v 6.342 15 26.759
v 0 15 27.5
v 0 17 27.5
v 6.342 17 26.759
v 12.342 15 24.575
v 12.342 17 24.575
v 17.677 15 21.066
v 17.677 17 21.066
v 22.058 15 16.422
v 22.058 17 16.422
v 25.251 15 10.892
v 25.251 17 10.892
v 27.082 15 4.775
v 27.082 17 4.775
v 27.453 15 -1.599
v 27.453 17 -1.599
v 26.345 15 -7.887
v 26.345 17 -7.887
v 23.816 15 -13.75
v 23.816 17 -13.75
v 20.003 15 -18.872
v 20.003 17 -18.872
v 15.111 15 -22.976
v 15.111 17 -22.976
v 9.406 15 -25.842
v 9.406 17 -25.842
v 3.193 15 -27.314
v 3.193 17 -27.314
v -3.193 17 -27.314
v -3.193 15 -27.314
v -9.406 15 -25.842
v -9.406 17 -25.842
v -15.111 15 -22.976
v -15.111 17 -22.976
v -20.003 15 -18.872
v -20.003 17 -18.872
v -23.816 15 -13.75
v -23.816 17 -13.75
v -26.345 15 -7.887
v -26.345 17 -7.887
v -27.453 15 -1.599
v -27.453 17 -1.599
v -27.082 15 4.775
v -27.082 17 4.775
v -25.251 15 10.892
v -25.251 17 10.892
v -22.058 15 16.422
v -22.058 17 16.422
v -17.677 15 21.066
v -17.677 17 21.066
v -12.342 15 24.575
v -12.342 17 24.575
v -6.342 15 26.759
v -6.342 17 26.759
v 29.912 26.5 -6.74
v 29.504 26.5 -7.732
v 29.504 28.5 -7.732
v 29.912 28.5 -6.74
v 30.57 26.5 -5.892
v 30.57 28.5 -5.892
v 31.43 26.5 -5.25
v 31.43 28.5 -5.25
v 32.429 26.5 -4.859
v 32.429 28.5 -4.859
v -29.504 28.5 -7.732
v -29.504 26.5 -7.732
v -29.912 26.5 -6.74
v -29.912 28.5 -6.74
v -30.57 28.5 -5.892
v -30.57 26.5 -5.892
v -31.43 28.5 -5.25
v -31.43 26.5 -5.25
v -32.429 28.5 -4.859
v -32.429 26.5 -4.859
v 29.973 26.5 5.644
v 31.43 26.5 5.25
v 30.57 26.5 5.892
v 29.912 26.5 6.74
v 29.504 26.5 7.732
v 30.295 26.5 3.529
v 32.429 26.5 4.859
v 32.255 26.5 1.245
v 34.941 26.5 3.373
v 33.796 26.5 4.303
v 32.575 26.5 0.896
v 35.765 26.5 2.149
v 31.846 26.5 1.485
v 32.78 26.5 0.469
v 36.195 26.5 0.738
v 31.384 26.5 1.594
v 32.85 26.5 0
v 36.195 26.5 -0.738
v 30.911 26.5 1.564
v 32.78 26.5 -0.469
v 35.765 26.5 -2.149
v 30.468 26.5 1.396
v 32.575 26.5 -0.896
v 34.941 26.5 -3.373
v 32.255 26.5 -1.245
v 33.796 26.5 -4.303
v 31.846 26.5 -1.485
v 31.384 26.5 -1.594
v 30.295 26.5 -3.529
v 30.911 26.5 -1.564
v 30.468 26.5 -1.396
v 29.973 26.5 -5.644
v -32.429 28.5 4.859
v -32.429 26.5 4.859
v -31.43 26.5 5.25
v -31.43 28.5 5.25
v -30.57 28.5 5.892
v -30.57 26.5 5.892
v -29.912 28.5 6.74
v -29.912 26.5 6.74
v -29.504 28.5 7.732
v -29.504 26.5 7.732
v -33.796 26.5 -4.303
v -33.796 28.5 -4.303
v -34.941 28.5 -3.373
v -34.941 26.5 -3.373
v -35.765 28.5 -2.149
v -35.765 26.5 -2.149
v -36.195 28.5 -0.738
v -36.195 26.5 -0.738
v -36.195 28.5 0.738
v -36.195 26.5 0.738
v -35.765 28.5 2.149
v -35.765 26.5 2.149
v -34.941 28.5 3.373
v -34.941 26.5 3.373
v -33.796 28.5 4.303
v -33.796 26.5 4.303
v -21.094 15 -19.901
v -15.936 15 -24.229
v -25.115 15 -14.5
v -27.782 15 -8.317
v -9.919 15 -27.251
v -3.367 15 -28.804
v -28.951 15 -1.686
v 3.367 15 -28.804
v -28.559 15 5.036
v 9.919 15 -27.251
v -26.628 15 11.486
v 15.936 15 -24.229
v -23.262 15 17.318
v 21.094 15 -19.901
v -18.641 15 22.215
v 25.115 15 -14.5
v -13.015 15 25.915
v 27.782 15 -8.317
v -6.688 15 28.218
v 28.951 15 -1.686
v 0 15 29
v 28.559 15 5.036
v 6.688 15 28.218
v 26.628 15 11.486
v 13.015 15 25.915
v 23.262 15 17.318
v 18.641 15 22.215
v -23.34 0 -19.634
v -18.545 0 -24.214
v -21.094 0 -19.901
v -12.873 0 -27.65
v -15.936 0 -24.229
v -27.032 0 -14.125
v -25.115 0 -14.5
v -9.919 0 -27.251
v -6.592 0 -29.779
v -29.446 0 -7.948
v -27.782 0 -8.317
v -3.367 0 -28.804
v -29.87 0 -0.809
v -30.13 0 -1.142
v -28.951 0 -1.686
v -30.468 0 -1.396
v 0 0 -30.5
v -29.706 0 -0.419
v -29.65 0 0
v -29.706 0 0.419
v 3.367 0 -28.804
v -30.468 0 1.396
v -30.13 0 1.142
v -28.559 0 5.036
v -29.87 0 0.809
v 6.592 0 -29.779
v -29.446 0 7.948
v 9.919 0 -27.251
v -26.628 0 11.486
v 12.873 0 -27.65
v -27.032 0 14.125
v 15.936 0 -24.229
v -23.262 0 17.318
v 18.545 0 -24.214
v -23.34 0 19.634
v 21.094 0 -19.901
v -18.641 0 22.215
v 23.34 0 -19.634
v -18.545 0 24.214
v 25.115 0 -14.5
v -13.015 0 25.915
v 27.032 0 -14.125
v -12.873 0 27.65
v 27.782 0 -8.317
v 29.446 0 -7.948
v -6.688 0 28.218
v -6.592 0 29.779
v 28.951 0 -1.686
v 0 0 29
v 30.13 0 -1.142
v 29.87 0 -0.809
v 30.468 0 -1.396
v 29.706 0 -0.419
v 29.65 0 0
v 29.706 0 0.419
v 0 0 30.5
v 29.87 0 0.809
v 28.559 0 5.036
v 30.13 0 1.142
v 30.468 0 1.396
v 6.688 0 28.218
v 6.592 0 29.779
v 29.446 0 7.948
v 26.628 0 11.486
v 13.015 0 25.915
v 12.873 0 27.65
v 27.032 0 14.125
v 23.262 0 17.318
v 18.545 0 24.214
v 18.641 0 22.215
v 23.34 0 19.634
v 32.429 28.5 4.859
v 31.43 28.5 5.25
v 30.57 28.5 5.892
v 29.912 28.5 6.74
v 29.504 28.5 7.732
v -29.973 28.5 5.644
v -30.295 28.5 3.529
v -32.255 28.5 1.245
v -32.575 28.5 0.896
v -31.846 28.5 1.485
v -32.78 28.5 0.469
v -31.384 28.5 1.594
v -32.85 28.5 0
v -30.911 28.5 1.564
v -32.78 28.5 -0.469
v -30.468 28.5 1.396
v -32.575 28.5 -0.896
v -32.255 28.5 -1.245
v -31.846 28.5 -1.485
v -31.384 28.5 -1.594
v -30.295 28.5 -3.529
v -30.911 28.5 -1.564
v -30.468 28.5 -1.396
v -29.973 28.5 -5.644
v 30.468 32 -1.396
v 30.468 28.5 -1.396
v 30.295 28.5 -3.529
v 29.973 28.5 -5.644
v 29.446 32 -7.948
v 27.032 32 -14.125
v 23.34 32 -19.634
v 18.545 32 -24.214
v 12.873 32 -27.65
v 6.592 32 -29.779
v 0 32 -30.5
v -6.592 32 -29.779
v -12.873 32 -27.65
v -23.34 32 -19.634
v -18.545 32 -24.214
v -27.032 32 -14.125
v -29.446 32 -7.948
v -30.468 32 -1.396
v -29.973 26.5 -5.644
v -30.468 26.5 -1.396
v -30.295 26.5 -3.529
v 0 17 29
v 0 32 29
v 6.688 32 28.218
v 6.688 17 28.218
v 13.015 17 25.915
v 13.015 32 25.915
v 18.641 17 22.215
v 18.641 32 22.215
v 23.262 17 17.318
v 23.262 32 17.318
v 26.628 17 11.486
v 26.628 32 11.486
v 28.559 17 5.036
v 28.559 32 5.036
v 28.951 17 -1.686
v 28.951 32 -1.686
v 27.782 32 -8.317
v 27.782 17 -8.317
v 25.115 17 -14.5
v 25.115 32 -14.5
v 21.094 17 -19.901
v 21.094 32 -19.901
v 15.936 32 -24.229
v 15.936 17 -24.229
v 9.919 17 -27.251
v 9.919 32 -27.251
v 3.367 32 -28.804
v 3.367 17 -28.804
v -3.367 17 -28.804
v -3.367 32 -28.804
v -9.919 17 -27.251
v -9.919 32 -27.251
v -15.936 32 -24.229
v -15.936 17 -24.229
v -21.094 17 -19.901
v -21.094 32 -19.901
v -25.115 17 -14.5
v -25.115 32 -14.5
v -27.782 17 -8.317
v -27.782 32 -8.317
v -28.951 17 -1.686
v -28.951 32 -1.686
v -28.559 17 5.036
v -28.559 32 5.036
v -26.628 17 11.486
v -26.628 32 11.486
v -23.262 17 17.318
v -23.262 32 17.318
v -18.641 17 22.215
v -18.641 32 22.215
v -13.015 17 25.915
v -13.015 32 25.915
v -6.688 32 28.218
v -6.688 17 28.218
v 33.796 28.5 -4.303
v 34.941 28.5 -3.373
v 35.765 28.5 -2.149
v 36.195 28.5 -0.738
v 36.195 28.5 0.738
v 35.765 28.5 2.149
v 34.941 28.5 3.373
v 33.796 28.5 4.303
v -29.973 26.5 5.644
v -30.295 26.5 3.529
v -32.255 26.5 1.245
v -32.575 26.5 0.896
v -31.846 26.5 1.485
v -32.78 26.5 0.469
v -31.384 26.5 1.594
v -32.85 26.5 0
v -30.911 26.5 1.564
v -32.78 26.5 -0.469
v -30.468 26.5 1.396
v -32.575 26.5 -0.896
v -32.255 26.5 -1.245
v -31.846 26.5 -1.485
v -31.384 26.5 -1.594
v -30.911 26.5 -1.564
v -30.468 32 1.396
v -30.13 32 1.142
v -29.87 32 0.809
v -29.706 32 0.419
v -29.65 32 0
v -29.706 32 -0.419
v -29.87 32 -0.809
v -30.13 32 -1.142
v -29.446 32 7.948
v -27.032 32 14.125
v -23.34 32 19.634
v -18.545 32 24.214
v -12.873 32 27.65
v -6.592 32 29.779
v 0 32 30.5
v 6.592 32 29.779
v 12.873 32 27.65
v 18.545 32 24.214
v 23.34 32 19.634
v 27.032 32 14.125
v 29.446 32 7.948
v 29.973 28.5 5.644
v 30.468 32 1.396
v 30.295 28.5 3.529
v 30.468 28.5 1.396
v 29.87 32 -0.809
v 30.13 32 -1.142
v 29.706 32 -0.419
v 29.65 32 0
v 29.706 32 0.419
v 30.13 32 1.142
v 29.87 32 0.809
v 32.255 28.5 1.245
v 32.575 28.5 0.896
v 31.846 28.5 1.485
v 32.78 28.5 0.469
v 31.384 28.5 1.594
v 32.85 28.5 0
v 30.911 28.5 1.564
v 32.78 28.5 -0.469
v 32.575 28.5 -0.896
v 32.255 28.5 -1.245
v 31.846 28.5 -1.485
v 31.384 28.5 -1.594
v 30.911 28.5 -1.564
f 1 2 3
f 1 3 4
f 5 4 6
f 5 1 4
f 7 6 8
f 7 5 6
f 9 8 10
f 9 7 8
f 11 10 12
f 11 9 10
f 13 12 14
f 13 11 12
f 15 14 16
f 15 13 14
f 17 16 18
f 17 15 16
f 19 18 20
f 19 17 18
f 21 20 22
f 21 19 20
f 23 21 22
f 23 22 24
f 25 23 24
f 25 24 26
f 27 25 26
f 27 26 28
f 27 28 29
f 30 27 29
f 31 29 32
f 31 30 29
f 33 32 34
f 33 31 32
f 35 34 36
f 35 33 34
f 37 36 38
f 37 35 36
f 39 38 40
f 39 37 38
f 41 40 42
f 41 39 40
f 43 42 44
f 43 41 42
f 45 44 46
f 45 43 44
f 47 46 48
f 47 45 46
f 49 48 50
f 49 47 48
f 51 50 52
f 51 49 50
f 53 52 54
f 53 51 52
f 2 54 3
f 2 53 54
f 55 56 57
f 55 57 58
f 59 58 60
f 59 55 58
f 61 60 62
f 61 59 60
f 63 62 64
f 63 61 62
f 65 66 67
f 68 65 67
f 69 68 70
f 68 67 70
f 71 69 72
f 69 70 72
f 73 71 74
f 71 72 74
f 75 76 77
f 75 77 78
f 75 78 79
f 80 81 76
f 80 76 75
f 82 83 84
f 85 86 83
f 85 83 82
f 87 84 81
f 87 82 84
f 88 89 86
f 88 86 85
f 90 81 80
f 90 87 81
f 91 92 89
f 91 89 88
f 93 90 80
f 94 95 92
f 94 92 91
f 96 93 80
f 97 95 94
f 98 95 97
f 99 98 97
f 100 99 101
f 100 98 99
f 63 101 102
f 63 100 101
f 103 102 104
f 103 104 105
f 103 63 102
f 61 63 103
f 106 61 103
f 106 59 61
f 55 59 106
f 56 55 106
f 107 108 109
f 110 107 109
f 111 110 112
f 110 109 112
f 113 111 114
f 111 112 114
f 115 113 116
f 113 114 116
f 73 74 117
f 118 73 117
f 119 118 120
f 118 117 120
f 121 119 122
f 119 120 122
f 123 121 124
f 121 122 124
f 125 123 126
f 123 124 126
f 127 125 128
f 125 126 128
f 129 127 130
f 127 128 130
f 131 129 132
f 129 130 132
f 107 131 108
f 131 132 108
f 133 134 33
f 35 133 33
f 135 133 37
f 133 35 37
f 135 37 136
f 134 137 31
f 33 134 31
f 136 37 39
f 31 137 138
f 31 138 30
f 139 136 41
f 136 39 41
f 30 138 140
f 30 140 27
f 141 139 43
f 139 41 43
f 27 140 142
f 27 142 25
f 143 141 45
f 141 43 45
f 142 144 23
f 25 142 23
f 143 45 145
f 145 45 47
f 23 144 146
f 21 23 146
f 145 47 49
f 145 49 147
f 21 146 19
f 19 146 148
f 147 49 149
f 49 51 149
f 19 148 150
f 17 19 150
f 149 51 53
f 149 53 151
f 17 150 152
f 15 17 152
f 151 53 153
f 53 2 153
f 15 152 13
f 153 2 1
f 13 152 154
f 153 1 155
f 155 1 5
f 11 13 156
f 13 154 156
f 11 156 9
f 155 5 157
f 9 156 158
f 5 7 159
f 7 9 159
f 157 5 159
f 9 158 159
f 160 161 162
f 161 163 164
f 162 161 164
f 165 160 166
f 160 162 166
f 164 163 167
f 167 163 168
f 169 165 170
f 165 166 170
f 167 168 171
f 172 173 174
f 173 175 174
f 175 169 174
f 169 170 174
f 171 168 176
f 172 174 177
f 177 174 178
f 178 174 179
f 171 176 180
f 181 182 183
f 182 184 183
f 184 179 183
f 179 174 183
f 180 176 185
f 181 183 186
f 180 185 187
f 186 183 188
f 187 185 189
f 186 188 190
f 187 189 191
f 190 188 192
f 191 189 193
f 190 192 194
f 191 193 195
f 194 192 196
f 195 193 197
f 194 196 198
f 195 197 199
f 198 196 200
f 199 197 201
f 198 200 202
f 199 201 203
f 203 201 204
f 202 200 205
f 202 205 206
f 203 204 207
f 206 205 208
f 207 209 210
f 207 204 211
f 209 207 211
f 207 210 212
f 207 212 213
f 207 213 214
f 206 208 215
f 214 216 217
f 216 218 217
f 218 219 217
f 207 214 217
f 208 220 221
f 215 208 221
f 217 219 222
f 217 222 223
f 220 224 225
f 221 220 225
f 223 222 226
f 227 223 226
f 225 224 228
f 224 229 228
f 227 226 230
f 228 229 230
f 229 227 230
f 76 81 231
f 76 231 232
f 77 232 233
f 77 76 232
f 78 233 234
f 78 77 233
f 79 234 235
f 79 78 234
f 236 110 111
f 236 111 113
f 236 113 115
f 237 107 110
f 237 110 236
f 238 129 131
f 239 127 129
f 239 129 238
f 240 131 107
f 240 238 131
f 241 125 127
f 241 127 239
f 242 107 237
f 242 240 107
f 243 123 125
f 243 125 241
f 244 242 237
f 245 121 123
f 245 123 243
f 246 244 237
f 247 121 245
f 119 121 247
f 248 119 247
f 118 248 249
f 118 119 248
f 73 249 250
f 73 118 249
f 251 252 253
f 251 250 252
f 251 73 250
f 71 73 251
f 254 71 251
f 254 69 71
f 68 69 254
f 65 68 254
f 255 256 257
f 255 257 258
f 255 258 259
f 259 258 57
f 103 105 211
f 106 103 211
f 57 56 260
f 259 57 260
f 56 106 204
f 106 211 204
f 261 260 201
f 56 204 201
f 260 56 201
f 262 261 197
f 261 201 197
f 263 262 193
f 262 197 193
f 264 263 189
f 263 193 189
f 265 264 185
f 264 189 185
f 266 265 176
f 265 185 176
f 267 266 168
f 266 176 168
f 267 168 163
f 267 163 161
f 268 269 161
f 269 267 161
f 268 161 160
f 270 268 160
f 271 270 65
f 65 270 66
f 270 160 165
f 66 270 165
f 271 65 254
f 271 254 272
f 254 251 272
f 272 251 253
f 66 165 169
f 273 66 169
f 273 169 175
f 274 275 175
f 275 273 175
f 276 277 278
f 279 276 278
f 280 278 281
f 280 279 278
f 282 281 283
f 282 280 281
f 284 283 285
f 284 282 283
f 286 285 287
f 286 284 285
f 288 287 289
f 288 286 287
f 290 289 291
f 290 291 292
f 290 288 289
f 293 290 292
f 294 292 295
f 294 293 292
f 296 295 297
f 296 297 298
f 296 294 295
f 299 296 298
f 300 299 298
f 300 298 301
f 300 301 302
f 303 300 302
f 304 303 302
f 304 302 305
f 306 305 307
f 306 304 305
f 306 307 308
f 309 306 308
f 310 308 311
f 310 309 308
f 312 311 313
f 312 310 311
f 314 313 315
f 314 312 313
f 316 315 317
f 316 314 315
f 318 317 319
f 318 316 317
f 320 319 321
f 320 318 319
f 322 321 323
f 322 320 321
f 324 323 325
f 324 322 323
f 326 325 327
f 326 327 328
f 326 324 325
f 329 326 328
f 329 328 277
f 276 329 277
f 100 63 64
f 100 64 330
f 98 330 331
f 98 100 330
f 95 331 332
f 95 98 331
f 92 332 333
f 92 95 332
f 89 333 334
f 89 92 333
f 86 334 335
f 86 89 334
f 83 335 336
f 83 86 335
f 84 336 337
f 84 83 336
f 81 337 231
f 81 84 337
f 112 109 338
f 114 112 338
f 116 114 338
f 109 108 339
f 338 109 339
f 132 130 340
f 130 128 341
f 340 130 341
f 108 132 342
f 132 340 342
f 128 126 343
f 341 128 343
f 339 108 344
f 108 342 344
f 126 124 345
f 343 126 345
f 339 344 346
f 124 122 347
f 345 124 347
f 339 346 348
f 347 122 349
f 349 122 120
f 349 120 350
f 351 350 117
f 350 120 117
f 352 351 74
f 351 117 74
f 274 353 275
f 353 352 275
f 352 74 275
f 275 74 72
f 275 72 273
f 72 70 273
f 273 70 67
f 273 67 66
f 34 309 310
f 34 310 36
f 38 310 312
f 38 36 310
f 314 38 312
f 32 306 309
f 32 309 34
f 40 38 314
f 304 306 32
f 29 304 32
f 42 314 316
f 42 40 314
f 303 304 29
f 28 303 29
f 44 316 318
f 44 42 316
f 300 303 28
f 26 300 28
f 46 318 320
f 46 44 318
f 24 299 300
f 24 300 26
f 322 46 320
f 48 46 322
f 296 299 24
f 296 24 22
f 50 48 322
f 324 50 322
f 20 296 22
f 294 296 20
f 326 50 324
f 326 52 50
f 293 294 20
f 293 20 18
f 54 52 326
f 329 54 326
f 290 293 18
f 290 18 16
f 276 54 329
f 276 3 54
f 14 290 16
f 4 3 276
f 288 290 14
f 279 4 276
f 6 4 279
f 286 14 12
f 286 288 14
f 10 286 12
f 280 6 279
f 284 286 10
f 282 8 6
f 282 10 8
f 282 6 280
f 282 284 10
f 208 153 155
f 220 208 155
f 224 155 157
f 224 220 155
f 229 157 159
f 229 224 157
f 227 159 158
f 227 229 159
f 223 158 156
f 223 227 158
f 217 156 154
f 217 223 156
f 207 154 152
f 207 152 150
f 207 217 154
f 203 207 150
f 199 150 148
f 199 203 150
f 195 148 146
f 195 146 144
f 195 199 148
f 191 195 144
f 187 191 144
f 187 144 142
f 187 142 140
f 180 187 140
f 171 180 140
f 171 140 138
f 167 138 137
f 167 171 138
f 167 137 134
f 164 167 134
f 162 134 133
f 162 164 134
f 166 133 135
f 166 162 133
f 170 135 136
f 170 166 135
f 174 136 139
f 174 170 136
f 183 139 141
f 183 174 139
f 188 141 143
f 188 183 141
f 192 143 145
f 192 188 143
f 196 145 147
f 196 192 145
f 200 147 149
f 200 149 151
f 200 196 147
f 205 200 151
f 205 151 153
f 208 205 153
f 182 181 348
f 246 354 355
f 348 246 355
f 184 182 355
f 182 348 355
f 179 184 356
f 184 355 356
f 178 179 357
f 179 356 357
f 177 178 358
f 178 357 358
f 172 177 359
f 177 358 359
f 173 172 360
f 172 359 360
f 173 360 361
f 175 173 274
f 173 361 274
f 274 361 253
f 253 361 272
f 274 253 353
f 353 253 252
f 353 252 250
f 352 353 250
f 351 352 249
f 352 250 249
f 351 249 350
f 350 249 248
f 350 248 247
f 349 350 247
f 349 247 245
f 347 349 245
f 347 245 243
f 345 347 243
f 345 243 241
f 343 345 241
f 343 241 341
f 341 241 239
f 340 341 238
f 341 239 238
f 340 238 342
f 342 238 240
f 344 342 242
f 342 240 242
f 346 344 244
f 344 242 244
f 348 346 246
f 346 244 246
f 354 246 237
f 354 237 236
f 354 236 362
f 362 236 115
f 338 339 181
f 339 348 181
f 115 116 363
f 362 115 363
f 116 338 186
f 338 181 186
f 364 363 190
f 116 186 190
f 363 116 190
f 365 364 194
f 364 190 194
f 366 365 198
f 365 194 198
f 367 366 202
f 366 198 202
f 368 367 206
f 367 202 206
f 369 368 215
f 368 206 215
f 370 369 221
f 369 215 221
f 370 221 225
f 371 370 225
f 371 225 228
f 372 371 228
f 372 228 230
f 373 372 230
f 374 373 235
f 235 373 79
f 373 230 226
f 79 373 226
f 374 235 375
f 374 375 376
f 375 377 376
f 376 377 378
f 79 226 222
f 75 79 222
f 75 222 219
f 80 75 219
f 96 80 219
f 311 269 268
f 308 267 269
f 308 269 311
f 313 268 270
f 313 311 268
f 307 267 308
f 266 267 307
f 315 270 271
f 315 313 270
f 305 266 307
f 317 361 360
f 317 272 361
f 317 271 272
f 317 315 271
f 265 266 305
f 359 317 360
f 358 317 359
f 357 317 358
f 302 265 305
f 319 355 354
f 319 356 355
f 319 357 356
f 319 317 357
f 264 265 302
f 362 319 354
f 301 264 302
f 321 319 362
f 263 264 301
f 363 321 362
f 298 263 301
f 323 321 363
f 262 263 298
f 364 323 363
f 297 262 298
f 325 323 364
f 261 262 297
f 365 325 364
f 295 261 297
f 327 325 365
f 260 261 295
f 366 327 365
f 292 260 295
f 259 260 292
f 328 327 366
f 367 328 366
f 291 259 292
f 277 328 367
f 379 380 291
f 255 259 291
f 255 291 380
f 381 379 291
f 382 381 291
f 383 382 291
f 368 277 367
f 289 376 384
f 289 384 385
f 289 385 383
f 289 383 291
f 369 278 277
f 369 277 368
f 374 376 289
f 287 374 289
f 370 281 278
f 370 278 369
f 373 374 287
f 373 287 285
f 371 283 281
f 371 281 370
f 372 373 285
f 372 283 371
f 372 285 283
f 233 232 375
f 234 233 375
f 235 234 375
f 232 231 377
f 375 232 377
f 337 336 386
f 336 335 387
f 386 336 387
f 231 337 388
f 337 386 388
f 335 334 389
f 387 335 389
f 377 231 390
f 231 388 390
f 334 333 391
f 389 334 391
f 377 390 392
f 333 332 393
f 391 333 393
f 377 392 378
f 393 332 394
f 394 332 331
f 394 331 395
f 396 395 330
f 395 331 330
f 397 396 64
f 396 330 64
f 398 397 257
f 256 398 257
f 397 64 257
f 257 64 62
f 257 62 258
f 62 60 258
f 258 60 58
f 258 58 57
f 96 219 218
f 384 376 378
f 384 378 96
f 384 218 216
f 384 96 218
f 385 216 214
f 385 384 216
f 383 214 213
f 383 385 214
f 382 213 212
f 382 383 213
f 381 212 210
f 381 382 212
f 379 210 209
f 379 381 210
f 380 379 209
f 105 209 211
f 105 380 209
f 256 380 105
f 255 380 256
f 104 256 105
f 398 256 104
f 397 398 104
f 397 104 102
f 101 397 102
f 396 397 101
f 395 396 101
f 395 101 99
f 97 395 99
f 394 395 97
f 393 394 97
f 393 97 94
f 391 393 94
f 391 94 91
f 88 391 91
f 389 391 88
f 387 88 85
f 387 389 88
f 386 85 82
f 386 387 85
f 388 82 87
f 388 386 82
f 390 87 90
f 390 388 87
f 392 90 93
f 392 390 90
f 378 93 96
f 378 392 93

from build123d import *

# Parameters (mm, degrees)
SKETCH1_R           = 30.5
SKETCH1_R_2         = 29
BOSS_EXTRUDE1_DEPTH = 15
SKETCH2_R           = 30.5
SKETCH2_R_2         = 27.5
BOSS_EXTRUDE2_DEPTH = 2
SKETCH3_R           = 30.5
SKETCH3_R_2         = 29
BOSS_EXTRUDE3_DEPTH = 15
BOSS_EXTRUDE4_DEPTH = 2
SKETCH5_R           = 1.6
CUT_EXTRUDE1_DEPTH  = 40


with BuildPart() as part:
    # Sketch1 → Boss-Extrude1 (new body)
    with BuildSketch(Plane(origin=(0, 0, 0), x_dir=(1, 0, 0), z_dir=(0, 1, 0))):
        with Locations(Location((0, 0, 0), (0, 0, 270))):
            Circle(SKETCH1_R)
        with Locations(Location((0, 0, 0), (0, 0, 270))):
            Circle(SKETCH1_R_2, mode=Mode.SUBTRACT)
    extrude(amount=BOSS_EXTRUDE1_DEPTH)

    # Sketch2 → Boss-Extrude2 (add)
    with BuildSketch(Plane(origin=(0, 15, 0), x_dir=(1, 0, 0), z_dir=(0, 1, 0))):
        with Locations(Location((0, 0, 0), (0, 0, 270))):
            Circle(SKETCH2_R)
        with Locations(Location((0, 0, 0), (0, 0, 270))):
            Circle(SKETCH2_R_2, mode=Mode.SUBTRACT)
    extrude(amount=BOSS_EXTRUDE2_DEPTH)

    # Sketch3 → Boss-Extrude3 (add)
    with BuildSketch(Plane(origin=(0, 17, 0), x_dir=(1, 0, 0), z_dir=(0, 1, 0))):
        with Locations(Location((0, 0, 0), (0, 0, 270))):
            Circle(SKETCH3_R)
        with Locations(Location((0, 0, 0), (0, 0, 270))):
            Circle(SKETCH3_R_2, mode=Mode.SUBTRACT)
    extrude(amount=BOSS_EXTRUDE3_DEPTH)

    # Sketch4 → Boss-Extrude4 (add)
    with BuildSketch(Plane(origin=(0, 26.5, 0), x_dir=(1, 0, 0), z_dir=(0, 1, 0))):
        with BuildLine():
            ThreePointArc((-32.429444444, -4.858900164), (-30.570387885, -5.892011652), (-29.503666667, -7.731988956))
            ThreePointArc((-29.503666667, -7.731988956), (-30.249891184, -3.897958868), (-30.5, 0))
            ThreePointArc((-30.5, 0), (-30.249891184, 3.897958868), (-29.503666667, 7.731988956))
            ThreePointArc((-29.503666667, 7.731988956), (-30.570387885, 5.892011652), (-32.429444444, 4.858900164))
            ThreePointArc((-32.429444444, 4.858900164), (-36.25, 0), (-32.429444444, -4.858900164))
        make_face()
    boss_extrude4 = extrude(amount=BOSS_EXTRUDE4_DEPTH)

    # Sketch5 → Cut-Extrude1 (cut)
    with BuildSketch(Plane(origin=(0, 32, 0), x_dir=(1, 0, 0), z_dir=(0, 1, 0))):
        with Locations(Location((-31.25, 0, 0), (0, 0, 299.256813925))):
            Circle(SKETCH5_R)
    cut_extrude1 = extrude(amount=-CUT_EXTRUDE1_DEPTH, mode=Mode.SUBTRACT)

    # Mirror1: Boss-Extrude4, Cut-Extrude1 across plane
    add(boss_extrude4.mirror(Plane(origin=(0, 0, 0), x_dir=(0, 0, 1), z_dir=(1, 0, 0))))
    add(cut_extrude1.mirror(Plane(origin=(0, 0, 0), x_dir=(0, 0, 1), z_dir=(1, 0, 0))), mode=Mode.SUBTRACT)


solid = part.part
